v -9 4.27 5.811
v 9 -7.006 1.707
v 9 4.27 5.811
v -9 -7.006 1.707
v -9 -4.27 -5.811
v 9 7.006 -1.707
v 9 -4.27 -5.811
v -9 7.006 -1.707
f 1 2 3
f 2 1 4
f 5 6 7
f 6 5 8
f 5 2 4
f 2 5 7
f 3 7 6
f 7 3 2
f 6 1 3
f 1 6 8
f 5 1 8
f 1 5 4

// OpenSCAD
// Auto-generated from tests/data/feature_fixtures_manifest.json
// fixture: box_rotated_x20
// fixture_type: box
// description: Plain box rotated 20 degrees around X. Complements existing Z-rotated cases with X-tilt baseline.
// transform: rotate=[20.000000, 0.000000, 0.000000], translate=[0.000000, 0.000000, 0.000000]
$fn = 96;

box_size = [18.000000, 12.000000, 8.000000];
box_origin = [-9.000000, -6.000000, -4.000000];

module through_hole_x(center, diameter, length) {
  translate([box_origin[0] - 0.1, center[1], center[2]])
    rotate(a=90, v=[0, 1, 0]) cylinder(d=diameter, h=length, center=false);
}

module through_hole_y(center, diameter, length) {
  translate([center[0], box_origin[1] - 0.1, center[2]])
    rotate(a=90, v=[-1, 0, 0]) cylinder(d=diameter, h=length, center=false);
}

module through_hole_z(center, diameter, length) {
  translate([center[0], center[1], box_origin[2] - 0.1])
    cylinder(d=diameter, h=length, center=false);
}

translate([0.000000, 0.000000, 0.000000])
rotate([20.000000, 0.000000, 0.000000]) {
difference() {
  translate(box_origin) cube(box_size);
}
}
